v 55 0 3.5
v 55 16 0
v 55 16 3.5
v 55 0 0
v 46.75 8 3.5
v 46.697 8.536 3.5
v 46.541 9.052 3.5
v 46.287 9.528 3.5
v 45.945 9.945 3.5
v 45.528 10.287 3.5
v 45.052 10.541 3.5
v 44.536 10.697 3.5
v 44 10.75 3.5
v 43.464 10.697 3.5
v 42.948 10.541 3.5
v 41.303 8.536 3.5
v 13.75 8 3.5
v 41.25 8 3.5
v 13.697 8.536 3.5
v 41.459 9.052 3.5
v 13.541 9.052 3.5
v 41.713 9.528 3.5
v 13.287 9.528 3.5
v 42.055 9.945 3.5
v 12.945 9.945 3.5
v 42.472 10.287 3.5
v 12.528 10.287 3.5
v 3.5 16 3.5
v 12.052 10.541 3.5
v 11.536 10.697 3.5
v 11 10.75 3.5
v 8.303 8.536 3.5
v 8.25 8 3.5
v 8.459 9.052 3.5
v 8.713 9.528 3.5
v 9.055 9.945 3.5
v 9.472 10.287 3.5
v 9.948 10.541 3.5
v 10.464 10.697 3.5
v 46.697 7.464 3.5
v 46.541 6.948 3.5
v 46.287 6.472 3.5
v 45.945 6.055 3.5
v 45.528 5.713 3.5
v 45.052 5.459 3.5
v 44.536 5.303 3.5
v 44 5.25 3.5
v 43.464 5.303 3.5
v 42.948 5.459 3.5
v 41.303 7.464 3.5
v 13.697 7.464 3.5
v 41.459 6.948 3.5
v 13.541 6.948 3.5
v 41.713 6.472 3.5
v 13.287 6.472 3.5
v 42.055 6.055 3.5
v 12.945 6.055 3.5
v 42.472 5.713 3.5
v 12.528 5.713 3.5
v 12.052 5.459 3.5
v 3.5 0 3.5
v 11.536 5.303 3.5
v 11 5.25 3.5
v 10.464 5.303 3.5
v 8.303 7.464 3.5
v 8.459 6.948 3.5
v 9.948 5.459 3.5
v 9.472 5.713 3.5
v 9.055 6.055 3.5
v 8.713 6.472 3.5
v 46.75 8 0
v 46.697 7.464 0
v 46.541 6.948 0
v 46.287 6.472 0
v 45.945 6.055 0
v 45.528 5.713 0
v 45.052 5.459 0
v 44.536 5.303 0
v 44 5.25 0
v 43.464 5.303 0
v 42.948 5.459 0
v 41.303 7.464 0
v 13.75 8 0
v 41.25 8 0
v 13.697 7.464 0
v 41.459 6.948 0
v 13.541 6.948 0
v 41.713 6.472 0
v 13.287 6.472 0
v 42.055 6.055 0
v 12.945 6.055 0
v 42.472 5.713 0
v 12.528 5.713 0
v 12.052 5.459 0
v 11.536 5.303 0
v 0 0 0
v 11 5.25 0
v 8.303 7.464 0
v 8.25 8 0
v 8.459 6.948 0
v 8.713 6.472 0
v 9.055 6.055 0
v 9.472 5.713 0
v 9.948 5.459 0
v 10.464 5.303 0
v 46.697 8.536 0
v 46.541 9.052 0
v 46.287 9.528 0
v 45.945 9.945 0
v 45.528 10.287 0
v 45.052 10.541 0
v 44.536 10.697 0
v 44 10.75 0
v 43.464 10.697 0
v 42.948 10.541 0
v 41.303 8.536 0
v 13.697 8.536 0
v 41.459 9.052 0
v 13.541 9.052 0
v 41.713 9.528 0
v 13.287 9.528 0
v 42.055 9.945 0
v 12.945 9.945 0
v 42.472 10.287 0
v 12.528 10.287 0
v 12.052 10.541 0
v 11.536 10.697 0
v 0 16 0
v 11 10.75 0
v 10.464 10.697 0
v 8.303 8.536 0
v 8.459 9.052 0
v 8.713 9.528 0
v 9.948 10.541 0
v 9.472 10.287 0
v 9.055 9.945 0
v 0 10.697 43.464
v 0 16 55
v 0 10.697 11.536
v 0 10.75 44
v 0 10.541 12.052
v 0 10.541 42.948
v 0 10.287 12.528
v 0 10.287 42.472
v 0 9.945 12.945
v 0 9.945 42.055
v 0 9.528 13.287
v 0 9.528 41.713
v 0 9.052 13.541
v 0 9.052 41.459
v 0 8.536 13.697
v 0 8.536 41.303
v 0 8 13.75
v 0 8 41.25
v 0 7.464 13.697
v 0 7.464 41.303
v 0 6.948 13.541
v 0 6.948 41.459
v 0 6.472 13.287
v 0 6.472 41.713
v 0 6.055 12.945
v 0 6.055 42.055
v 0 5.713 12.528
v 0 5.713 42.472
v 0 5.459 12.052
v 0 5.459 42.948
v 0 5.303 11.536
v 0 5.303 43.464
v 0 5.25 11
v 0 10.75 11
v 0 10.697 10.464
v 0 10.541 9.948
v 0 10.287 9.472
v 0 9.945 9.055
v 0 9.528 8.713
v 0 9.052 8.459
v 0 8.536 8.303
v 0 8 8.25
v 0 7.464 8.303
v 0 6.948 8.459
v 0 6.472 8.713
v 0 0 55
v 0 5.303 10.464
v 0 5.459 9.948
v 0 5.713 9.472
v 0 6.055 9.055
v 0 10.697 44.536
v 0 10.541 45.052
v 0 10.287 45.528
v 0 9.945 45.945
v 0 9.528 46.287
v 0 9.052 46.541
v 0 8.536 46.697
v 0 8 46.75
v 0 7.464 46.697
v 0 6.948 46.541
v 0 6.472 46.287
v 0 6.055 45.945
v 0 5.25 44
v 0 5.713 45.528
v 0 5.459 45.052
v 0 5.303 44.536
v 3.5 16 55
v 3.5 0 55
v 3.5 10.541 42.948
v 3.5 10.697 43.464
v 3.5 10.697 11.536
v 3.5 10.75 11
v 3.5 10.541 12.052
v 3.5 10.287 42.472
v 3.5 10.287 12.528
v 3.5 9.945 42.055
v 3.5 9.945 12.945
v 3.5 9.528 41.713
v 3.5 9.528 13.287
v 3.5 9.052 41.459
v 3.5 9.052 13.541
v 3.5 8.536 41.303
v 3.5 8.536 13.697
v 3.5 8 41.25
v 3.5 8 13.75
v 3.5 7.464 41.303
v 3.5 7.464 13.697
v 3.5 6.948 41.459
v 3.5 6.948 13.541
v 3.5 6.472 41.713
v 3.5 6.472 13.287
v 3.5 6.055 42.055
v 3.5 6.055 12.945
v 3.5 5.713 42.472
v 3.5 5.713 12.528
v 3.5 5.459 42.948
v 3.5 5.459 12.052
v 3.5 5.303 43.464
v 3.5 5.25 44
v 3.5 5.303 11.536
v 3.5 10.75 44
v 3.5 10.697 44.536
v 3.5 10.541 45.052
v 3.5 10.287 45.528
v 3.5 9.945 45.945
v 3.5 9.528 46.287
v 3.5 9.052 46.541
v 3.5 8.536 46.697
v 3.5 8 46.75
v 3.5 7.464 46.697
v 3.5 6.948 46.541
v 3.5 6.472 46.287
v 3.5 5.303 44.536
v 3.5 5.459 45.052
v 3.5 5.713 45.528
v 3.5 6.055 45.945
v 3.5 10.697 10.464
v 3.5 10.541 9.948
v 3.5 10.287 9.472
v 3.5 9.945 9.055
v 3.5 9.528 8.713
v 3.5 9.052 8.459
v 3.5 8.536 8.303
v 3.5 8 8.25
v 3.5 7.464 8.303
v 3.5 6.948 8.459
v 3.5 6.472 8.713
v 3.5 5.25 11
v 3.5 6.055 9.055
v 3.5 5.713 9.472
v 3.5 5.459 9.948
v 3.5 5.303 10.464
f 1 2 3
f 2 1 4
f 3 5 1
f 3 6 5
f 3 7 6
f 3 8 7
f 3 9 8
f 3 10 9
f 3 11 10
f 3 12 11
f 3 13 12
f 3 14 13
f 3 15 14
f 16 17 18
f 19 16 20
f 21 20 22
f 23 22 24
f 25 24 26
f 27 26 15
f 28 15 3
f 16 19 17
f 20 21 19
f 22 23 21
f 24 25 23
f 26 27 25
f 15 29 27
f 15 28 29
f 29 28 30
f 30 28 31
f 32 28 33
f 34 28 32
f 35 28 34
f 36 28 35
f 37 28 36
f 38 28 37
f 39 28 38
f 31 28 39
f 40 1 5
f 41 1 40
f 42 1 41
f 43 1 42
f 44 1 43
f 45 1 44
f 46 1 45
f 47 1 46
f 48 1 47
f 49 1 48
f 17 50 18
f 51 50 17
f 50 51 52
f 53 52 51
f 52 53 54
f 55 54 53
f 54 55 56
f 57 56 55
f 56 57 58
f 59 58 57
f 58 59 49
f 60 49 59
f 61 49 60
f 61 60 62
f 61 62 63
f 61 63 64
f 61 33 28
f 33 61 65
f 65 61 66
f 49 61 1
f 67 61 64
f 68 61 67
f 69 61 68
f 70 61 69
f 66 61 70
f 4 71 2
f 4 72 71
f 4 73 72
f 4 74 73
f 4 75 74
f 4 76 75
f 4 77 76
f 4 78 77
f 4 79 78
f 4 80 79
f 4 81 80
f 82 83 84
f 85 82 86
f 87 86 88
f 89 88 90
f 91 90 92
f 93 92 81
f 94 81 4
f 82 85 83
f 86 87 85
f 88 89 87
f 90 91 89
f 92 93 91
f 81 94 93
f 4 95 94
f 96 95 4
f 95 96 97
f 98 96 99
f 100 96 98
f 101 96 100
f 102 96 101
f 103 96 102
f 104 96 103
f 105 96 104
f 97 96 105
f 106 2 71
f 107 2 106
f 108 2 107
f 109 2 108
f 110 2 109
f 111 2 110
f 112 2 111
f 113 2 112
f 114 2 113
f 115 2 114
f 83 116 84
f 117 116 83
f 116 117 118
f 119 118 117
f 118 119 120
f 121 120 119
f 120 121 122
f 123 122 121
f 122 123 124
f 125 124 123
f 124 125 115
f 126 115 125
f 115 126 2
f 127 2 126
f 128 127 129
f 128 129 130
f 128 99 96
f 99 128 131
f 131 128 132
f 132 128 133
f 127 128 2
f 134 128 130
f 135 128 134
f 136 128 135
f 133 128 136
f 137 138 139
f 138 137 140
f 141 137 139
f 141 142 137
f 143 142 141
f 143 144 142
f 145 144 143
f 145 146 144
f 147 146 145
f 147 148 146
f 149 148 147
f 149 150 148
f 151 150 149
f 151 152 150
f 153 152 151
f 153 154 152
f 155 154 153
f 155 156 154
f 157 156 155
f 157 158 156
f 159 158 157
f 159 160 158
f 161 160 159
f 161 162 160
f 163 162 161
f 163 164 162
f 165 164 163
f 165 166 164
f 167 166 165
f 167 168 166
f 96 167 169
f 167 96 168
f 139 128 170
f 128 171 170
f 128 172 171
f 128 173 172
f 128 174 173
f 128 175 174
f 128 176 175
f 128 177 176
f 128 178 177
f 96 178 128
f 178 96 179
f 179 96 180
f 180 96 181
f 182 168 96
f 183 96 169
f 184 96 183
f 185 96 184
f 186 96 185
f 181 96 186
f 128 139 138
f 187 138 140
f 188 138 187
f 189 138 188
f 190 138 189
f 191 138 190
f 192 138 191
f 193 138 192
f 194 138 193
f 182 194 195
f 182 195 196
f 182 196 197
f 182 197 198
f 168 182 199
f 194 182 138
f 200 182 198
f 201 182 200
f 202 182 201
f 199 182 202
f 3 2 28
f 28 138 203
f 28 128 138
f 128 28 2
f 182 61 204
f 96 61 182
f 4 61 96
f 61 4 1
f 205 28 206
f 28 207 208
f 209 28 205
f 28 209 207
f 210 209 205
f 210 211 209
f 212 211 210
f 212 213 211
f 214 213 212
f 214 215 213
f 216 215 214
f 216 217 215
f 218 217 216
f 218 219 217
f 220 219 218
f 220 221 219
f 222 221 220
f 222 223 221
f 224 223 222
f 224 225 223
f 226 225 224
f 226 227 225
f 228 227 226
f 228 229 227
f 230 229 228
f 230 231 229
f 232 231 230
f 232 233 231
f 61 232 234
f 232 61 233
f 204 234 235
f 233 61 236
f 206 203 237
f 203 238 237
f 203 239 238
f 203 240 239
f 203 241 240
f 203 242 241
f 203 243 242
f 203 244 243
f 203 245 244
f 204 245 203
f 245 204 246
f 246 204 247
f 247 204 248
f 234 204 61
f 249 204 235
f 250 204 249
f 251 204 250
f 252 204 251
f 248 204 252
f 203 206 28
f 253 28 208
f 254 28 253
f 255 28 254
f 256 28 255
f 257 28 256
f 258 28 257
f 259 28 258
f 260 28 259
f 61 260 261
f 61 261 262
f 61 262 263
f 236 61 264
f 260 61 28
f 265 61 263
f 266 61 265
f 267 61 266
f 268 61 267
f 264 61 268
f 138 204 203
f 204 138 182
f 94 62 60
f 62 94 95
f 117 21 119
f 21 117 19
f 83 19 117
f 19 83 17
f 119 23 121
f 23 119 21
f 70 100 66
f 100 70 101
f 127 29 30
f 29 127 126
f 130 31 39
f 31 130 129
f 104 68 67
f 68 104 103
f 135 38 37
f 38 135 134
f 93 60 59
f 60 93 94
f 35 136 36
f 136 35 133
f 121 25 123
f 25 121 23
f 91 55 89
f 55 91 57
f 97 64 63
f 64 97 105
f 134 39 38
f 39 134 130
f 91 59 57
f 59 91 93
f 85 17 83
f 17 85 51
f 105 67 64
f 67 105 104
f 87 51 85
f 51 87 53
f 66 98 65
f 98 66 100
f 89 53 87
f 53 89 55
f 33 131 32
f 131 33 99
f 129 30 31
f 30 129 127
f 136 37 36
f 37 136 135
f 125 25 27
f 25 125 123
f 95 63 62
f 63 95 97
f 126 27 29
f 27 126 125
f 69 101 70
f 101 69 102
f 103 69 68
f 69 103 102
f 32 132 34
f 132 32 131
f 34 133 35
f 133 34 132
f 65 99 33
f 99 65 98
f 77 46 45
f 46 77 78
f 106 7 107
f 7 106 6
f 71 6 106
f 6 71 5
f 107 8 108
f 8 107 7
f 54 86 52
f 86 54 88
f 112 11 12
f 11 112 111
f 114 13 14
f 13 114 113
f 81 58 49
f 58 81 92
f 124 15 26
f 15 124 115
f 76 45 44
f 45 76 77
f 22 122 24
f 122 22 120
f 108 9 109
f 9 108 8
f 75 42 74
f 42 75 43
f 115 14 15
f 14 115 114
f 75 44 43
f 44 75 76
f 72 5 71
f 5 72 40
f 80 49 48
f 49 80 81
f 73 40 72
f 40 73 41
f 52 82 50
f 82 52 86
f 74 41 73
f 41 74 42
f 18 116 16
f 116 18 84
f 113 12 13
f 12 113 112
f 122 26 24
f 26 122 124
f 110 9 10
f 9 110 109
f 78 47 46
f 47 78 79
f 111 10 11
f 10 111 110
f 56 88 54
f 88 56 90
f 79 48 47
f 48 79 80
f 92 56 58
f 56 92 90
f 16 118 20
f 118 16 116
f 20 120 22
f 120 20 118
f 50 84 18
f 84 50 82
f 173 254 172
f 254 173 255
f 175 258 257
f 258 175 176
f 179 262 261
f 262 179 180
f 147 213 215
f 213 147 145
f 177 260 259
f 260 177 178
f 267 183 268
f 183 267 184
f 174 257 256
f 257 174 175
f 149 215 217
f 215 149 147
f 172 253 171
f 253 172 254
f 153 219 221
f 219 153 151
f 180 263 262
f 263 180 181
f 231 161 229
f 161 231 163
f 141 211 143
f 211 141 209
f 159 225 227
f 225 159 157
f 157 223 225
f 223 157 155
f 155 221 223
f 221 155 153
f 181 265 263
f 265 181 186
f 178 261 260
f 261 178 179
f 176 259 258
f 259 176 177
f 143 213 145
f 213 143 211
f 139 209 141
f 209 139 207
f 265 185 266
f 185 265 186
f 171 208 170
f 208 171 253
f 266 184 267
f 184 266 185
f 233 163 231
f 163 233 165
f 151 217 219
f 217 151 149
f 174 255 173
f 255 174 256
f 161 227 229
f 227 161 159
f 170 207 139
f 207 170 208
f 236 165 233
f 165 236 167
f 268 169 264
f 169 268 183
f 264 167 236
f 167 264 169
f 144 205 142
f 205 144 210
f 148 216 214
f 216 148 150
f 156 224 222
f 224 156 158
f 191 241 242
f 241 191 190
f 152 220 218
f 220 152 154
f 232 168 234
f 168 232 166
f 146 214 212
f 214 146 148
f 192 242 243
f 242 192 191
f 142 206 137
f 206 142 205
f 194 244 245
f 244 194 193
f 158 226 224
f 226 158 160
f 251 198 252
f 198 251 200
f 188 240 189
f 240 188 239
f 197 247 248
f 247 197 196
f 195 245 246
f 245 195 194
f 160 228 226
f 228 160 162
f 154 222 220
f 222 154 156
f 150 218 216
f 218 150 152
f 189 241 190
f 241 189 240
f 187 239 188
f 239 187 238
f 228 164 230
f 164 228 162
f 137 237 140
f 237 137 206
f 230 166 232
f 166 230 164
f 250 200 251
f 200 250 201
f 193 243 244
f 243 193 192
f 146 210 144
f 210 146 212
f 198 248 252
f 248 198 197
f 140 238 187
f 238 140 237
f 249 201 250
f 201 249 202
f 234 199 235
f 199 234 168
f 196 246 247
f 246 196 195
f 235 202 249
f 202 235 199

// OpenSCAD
$fn = 32;

// ----------------------------------------------------------------------
// L-bracket: 55 x 16 x 55 mm
// ----------------------------------------------------------------------

// --- parameters (mm) ---
base_len = 55;            // horizontal leg, X
upright_h = 55;           // vertical leg, Z
flange_w = 16;            // bracket depth, Y
mat_t = 3.5;              // plate thickness
hole_d = 5.5;             // clearance for M5

module hole_z(px, py) {
  translate([px, py, -0.5]) cylinder(h = mat_t + 1, d = hole_d);
}
module hole_x(pz, py) {
  translate([-0.5, py, pz]) rotate([0, 90, 0]) cylinder(h = mat_t + 1, d = hole_d);
}

difference() {
  union() {
    /* horizontal leg */
    cube([base_len, flange_w, mat_t]);
    /* vertical leg, overlapping the corner block */
    cube([mat_t, flange_w, upright_h]);
  }
  hole_z(11, 8);
  hole_z(44, 8);
  hole_x(11, 8);
  hole_x(44, 8);
}
